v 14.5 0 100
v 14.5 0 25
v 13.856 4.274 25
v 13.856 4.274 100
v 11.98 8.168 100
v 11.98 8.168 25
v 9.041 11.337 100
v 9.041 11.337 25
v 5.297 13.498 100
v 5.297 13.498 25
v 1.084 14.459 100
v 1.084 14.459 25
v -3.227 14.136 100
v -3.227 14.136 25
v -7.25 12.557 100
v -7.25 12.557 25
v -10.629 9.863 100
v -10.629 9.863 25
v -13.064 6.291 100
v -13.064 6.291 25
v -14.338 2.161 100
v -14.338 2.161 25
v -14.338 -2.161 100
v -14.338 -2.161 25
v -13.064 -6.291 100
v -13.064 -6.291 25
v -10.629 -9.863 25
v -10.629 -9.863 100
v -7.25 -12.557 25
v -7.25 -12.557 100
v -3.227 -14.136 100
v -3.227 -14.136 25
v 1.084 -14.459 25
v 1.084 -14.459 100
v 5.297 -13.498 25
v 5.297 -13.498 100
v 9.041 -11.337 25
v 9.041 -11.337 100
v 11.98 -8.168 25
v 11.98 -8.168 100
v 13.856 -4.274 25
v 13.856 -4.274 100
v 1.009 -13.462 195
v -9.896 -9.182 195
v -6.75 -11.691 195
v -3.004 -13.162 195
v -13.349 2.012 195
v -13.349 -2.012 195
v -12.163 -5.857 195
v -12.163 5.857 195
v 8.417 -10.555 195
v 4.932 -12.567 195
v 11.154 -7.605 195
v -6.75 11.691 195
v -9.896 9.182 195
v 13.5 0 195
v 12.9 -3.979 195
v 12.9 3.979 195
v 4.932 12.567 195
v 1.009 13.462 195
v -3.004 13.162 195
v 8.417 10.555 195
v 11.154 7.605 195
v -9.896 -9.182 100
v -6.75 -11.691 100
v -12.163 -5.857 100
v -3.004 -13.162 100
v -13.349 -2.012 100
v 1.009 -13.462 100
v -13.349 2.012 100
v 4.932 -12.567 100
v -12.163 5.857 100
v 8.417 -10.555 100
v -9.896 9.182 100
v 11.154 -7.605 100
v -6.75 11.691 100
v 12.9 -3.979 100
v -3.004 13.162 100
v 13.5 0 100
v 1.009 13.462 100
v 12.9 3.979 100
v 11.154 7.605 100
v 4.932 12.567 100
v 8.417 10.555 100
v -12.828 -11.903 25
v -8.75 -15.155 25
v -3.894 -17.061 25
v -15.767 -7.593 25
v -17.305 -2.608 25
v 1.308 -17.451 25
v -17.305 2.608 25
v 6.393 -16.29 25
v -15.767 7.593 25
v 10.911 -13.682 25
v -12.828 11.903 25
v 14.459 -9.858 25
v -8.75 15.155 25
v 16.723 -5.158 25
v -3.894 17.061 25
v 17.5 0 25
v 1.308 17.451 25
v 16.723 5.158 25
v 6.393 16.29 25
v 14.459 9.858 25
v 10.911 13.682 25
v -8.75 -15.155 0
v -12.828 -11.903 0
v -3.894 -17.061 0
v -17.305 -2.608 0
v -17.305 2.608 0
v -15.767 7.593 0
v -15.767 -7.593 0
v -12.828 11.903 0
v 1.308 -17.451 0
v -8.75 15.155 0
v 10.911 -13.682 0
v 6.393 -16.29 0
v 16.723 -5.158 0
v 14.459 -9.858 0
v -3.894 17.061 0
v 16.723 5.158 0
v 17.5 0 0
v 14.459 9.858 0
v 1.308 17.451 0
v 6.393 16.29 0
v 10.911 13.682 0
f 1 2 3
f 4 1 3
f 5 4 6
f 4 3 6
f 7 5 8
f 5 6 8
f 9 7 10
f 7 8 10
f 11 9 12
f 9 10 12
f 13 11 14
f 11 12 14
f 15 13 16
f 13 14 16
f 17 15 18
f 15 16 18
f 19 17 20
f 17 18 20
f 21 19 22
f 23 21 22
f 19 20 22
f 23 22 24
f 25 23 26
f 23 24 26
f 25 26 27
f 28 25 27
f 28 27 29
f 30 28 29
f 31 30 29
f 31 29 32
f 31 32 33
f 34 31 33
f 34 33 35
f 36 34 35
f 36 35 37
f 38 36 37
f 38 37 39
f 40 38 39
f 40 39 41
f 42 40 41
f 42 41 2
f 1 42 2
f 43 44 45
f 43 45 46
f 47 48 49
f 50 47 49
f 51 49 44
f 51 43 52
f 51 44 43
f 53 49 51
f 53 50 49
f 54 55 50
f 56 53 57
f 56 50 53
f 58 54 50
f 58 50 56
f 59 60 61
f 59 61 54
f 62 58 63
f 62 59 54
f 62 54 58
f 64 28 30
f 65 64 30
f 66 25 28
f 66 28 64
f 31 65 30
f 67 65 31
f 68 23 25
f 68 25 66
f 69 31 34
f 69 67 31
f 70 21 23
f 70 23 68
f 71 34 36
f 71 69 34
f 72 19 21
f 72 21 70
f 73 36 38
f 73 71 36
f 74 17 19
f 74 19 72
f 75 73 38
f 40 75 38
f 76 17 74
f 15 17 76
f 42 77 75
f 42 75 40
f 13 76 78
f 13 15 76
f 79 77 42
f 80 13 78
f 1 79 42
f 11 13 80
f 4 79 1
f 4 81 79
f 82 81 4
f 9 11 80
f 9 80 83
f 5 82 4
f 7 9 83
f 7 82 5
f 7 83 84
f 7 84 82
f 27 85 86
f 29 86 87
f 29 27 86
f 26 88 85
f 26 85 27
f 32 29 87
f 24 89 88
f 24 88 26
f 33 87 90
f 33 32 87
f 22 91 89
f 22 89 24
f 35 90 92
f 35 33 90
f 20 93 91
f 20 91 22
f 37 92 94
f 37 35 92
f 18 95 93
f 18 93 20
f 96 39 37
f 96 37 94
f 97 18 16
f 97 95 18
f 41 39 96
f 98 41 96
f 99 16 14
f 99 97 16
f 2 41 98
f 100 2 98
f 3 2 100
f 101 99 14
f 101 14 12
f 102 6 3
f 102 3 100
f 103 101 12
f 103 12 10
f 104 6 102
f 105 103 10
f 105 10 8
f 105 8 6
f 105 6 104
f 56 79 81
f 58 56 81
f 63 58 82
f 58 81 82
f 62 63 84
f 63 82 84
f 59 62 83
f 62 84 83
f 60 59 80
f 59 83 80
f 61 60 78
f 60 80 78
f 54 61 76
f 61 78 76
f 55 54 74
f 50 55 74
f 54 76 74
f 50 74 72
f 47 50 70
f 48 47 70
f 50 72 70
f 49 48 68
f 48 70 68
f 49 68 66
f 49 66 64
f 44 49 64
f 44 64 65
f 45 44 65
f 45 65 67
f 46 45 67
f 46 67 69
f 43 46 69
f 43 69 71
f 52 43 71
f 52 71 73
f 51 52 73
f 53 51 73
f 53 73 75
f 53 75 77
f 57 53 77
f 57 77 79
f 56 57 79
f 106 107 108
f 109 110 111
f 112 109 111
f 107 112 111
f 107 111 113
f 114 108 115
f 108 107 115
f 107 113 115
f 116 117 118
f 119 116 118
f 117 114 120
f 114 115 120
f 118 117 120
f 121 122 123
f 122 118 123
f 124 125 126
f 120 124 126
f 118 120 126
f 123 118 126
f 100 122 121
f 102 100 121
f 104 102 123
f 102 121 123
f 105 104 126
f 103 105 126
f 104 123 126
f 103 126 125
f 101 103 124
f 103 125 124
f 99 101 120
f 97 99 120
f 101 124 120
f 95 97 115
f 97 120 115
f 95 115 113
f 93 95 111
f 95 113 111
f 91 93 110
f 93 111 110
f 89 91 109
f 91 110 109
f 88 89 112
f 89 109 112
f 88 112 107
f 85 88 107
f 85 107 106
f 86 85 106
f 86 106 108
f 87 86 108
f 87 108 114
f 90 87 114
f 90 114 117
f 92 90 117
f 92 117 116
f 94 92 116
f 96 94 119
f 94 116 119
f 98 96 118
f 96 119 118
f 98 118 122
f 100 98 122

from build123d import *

# Parameters (mm, degrees)
F0_R     = 13.5
F1_DEPTH = 195
F2_R     = 17.5
F3_DEPTH = 25
F4_R     = 14.5
F5_DEPTH = 100


with BuildPart() as f1:
    # F0 (on Top) → F1 (new body)
    with BuildSketch(Plane.XY):
        Circle(F0_R)
    extrude(amount=F1_DEPTH)

    # F2 (on Top) → F3 (join)
    with BuildSketch(Plane.XY):
        Circle(F2_R)
    extrude(amount=F3_DEPTH)

    # F4 (on Top) → F5 (join)
    with BuildSketch(Plane.XY):
        Circle(F4_R)
    extrude(amount=F5_DEPTH)


solid = f1.part
